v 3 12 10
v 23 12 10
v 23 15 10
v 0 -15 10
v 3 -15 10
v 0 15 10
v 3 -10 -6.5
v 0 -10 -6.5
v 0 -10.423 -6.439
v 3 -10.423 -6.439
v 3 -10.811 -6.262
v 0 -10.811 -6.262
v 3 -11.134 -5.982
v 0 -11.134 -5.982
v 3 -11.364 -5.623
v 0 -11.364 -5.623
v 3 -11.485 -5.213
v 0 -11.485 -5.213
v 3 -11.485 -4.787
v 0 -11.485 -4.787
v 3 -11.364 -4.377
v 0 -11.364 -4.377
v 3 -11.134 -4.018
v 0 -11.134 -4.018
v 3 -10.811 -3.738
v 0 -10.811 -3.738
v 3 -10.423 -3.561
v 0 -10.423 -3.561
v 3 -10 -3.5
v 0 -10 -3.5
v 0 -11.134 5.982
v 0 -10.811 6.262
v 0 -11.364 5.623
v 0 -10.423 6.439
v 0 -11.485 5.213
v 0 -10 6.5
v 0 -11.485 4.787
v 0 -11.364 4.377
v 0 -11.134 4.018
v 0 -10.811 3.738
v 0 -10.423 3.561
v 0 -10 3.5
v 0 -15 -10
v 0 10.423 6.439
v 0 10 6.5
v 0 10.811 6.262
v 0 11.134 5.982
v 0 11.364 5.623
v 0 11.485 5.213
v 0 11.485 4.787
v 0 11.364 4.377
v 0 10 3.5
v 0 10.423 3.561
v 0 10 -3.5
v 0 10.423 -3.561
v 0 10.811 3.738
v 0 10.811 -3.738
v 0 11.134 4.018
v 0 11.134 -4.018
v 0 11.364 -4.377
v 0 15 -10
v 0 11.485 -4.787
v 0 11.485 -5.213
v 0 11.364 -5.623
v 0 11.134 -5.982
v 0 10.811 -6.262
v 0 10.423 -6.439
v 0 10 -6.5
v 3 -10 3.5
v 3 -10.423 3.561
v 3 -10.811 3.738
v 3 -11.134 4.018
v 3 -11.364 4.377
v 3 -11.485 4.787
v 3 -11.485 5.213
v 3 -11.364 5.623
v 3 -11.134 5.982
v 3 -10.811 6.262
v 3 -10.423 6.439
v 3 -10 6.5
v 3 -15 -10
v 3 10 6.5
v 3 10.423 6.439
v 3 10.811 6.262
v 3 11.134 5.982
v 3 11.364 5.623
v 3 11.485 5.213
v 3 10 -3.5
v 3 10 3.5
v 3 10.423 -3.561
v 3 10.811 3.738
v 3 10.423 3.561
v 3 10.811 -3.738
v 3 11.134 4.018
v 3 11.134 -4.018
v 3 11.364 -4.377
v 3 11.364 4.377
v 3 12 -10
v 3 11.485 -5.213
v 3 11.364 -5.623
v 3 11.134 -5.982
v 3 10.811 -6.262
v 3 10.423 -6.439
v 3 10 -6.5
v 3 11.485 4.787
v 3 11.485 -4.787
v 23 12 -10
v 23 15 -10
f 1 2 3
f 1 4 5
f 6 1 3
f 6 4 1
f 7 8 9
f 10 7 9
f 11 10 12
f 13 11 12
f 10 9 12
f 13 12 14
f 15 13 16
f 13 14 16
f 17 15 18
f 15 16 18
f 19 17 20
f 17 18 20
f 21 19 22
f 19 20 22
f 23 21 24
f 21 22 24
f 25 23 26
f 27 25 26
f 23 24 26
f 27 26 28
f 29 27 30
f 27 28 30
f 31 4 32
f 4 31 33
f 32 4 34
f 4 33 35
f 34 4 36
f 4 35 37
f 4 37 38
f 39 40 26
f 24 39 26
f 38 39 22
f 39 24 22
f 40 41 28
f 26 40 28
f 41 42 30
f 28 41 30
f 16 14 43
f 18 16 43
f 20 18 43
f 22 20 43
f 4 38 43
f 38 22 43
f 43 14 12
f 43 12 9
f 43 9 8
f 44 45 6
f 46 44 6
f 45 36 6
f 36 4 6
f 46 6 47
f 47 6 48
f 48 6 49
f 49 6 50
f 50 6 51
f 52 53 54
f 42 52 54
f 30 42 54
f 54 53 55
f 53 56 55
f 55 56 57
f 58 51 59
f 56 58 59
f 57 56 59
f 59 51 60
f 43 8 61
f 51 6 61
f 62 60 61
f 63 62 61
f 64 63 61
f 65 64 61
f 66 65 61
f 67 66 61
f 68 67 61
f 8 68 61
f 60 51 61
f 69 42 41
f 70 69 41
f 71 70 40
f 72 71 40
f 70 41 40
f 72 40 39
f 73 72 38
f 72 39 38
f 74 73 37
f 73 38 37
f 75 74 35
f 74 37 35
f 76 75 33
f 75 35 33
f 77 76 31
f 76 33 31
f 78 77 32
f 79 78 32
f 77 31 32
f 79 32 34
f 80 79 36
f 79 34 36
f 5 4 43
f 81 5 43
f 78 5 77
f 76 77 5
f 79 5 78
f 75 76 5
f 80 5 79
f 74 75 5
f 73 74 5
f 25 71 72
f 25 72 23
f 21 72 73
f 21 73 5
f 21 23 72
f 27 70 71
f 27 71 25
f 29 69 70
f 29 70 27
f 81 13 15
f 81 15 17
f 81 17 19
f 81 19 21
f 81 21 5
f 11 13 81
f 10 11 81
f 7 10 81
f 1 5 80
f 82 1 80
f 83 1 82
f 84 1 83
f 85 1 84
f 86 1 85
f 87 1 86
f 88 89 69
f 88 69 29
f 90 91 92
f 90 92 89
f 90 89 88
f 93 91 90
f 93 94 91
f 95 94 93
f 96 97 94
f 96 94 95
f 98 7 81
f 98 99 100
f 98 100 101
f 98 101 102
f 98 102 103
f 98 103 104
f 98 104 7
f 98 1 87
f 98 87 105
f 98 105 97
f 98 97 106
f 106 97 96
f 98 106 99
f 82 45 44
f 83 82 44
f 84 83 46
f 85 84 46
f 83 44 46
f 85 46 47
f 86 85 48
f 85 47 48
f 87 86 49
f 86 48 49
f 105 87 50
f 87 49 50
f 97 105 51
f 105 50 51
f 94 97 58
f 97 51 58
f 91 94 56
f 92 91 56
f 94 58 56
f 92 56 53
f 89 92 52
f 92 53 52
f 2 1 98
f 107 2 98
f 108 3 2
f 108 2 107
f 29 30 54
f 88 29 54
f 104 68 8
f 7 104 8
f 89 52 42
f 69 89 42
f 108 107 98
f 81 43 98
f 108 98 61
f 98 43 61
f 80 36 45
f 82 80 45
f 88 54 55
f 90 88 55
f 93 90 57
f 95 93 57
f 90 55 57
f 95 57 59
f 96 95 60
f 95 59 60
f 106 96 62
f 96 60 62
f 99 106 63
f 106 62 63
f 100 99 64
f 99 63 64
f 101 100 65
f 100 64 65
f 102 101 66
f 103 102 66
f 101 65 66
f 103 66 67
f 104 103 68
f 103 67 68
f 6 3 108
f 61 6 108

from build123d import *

# Parameters (mm, degrees)
SKETCH1_W           = 20
SKETCH1_H           = 30
BOSS_EXTRUDE1_DEPTH = 3
SKETCH2_W           = 20
SKETCH2_H           = 3
BOSS_EXTRUDE2_DEPTH = 20


with BuildPart() as part:
    # Sketch1 → Boss-Extrude1 (new body)
    with BuildSketch(Plane(origin=(0, 0, 0), x_dir=(0, 0, -1), z_dir=(1, 0, 0))):
        Rectangle(SKETCH1_W, SKETCH1_H)
        with BuildLine():
            Line((-3.5, 10), (-3.5, -10))
            ThreePointArc((-3.5, -10), (-5, -11.5), (-6.5, -10))
            Line((-6.5, -10), (-6.5, 10))
            ThreePointArc((-6.5, 10), (-5, 11.5), (-3.5, 10))
        make_face(mode=Mode.SUBTRACT)
        with BuildLine():
            Line((6.5, 10), (6.5, -10))
            ThreePointArc((6.5, -10), (5, -11.5), (3.5, -10))
            Line((3.5, -10), (3.5, 10))
            ThreePointArc((3.5, 10), (5, 11.5), (6.5, 10))
        make_face(mode=Mode.SUBTRACT)
    extrude(amount=BOSS_EXTRUDE1_DEPTH)

    # Sketch2 → Boss-Extrude2 (add)
    with BuildSketch(Plane(origin=(3, 0, 0), x_dir=(0, 0, -1), z_dir=(1, 0, 0))):
        with Locations((0, 13.5)):
            Rectangle(SKETCH2_W, SKETCH2_H)
    extrude(amount=BOSS_EXTRUDE2_DEPTH)


solid = part.part
